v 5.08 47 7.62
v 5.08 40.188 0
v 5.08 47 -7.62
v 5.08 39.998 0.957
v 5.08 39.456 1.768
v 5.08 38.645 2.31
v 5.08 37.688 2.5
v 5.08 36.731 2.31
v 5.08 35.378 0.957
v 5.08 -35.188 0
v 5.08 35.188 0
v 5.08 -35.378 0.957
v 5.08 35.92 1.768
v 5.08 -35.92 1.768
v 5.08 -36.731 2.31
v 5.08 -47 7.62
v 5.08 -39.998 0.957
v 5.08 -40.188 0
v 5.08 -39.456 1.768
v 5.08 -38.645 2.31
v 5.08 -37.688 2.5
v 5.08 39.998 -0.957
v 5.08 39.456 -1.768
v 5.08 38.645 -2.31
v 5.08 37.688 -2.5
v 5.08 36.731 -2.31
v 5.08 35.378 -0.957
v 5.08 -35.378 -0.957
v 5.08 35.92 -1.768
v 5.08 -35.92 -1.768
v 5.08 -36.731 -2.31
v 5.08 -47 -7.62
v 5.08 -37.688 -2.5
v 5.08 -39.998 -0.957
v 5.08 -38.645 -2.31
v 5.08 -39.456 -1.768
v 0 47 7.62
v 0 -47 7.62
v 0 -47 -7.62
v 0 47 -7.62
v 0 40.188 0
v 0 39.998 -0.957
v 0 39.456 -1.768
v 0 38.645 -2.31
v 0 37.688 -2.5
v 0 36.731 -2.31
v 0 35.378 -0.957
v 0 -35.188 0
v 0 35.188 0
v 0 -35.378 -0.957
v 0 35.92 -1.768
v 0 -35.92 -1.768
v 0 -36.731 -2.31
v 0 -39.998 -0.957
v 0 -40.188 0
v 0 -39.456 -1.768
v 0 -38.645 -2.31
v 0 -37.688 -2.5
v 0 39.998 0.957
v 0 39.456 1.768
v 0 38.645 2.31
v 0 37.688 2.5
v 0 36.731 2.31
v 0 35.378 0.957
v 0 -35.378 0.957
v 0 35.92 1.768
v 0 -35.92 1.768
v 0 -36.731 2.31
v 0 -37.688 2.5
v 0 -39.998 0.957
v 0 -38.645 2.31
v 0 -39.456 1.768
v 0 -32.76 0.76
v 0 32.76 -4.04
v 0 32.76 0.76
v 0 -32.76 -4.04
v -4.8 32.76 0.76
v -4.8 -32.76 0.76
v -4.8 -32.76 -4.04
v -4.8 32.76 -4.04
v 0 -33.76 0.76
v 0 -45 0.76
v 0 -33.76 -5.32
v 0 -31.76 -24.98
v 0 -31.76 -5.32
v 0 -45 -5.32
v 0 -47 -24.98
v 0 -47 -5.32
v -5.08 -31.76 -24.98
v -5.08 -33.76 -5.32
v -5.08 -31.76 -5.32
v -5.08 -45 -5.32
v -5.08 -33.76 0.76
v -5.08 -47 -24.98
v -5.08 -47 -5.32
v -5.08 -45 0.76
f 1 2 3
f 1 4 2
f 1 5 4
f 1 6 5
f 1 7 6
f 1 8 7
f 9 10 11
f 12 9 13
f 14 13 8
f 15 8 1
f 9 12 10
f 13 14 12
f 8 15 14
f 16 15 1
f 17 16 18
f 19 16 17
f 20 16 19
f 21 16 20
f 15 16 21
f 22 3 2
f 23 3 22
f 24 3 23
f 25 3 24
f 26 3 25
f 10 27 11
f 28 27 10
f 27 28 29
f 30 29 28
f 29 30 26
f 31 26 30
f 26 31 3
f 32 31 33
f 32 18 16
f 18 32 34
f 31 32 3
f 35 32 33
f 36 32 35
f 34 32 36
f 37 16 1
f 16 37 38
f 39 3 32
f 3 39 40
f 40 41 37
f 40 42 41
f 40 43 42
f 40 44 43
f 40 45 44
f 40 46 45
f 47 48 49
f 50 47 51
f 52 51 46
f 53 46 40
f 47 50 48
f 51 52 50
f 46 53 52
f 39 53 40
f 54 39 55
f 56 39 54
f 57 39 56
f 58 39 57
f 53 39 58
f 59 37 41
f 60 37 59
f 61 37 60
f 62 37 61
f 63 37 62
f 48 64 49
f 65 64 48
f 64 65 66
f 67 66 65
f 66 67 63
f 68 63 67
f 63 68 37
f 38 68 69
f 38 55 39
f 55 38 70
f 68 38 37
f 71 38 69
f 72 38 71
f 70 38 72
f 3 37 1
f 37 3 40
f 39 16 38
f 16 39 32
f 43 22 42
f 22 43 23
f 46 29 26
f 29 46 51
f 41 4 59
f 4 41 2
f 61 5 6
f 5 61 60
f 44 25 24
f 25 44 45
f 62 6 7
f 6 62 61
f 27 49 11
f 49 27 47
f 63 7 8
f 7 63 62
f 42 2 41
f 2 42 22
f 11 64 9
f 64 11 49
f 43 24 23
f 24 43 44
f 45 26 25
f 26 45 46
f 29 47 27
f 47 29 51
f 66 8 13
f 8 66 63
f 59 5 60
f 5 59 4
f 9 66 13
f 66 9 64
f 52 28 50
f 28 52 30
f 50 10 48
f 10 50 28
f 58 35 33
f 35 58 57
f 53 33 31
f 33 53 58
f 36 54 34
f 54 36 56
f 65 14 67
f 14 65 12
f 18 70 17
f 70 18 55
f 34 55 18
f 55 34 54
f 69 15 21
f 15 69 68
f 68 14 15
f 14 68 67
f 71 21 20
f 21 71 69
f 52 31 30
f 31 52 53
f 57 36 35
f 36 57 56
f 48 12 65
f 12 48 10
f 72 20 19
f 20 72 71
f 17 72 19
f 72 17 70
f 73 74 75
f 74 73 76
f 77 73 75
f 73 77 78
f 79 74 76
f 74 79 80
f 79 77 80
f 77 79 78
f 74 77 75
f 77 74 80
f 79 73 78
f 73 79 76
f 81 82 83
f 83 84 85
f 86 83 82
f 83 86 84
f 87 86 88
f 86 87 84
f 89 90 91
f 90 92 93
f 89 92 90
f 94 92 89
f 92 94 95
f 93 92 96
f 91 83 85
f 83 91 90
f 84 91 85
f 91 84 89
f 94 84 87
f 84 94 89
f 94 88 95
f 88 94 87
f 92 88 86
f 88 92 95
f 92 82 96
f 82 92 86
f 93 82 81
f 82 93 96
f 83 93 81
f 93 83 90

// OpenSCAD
// file: ../hdim.scad
module hdim(x1 = 10, x2 = 20, y = 10, dimline_lenght = 9.0) 
{
    dimline_overlap = 0.5;
    dimline_width = 0.3;
    text_size = 2;
    tmp = 2*dimline_overlap+text_size/2;
    text_pos = dimline_lenght>0 ? tmp : -tmp; 
    dimline_abs = dimline_lenght>0 ? dimline_lenght : -dimline_lenght;
    
    color([0,0,0])
    {
        translate([x1,y-dimline_lenght/2,0]) 
            square([dimline_width, 
                dimline_abs + 2*dimline_overlap], 
                center=true, $fs=0.01);
                
        translate([x2,y-dimline_lenght/2,0]) 
            square([dimline_width, 
                dimline_abs + 2*dimline_overlap], 
                center=true, $fs=0.01);

        translate([(x1+x2)/2,y-dimline_lenght,0]) 
            square([x2-x1, 
                dimline_width], 
                center=true, $fs=0.01);
    }
        
    translate([(x1+x2)/2,y-dimline_lenght-text_pos,0]) 
    {
        color([0,0,0])
        cube([text_size * 5, 1.2*text_size, 0.9], center=true);
        
        color([0.8,0.8,0.5,1.0])
        {
            translate([0,0,0.2])
            text(str(0.1*round((x2-x1)*10)), size = text_size, 
                halign = "center",valign = "center");
            translate([0,0,-0.2])
            rotate([0,180,0])
            text(str(0.1*round((x2-x1)*10)), size = text_size, 
                halign = "center",valign = "center");
        }
    }
}

hdim();
// file: bedleg.scad
module bedleg(cw_w = 5.08, cw_h = 15.24, mirror = true, leglength=25.7,leg_angle=0) 
{
    translate([-cw_w/2,0, -cw_w/2]) 
    rotate([0,leg_angle,0])
    translate([cw_w/2,0, cw_w/2]) 
    {
        if (mirror) 
        {
            translate([-cw_w,0,-leglength]) 
                oneleg(cw_w, cw_h, leglength);
        }
        else {
            translate([0,0,-leglength])
                oneleg(cw_w, cw_h, leglength);

        }
    }
}

module oneleg(cw_w = 5.08, cw_h = 15.24, leglength=25.7)
{
    indent_w = 2;
    indent_h = cw_w + 1;
    
    color([0.40,0.30,0.16,1.0])
    translate([cw_w,0,leglength])
    rotate([-90,0,90])
    linear_extrude(cw_w)
    polygon(points=[[indent_w,0],[cw_h-indent_w,0],[cw_h-indent_w, indent_h],[cw_h, indent_h],[cw_h, leglength],[0,leglength],[0,indent_h], [indent_w,indent_h]]);

    color([0.8,0.8,0.5,1.0])
    {
        translate([0,cw_h/2,0]) 
        rotate([90,90,-90])
        text(str(0.1 * round(10*leglength)), size = 6, 
            halign = "right",valign = "center"); 
        translate([cw_w,cw_h/2,0]) 
        rotate([90,90,90])
        text(str(0.1 * round(10*leglength)), size = 6, 
            halign = "right",valign = "center");
    }
}    

bedleg();
// main file
use <bedleg.scad> 
use <../hdim.scad> 
extra_leg_spacing = -1.0;
bighole_diam = 5.0;
bighole_spacing = 0.3;
bighole_pos_coeff = 1.40; 

module bedend(mattress_width = 94, cw_w = 5.08, cw_h = 15.24, jw_w=4.80, jw_h = 4.8, groove_depth = 1.5, bed_height = 32.6,
    which_leg_to_hide = false) 
{
    leglength = bed_height - cw_h + jw_h - groove_depth + cw_w;

    translate([cw_w/2,0,0])
        color([0.71,0.40,0.11])
        difference() 
    {
        cube([cw_w, mattress_width, cw_h],center=true);
        
        translate([0,mattress_width/2 - bighole_pos_coeff * cw_w - bighole_diam/2+bighole_spacing,0])
        rotate([0,90,0]) 
        cylinder(h=cw_w+0.2,r=bighole_diam/2,center = true, $fn = 16);

        translate([0,-mattress_width/2 + bighole_pos_coeff * cw_w + bighole_diam/2 - bighole_spacing,0])
        rotate([0,90,0]) 
        cylinder(h=cw_w+0.2,r=bighole_diam/2,center = true, $fn = 16);
    }
    
    color([0.8,0.8,0.5,1.0])
    {
        translate([0,0,1.5]) 
        rotate([90,0,-90])
        text(str(0.1 * round(10*mattress_width)), size = 5, 
            halign = "center",valign = "bottom"); 
        translate([cw_w, 0,0]) 
        rotate([90,0,90])
        text(str(0.1 * round(10*mattress_width)), size = 6, 
            halign = "center",valign = "center");
    }
    
    translate([-cw_w-cw_h, 
        mattress_width/2, 
        -cw_h/2+jw_h-groove_depth+cw_w-leglength/2]) 
    rotate([90,-90,180]) 
    hdim(-leglength/2, leglength/2, jw_h/100, 3);
   
    translate([cw_w,0,0]) rotate([90,0,90])
        hdim(-mattress_width/2, mattress_width/2, 0, 16);

    translate([cw_w,0,0]) rotate([90,0,90])
        hdim(-mattress_width/2, -mattress_width/2 + bighole_pos_coeff * cw_w + bighole_diam/2 - bighole_spacing, 0, 4);
    
    w = mattress_width-2*cw_h-2*extra_leg_spacing;
    translate([-jw_w/2,0,-cw_h/2-jw_h/2+jw_h-groove_depth+cw_w]) 
        cube([jw_w, w, jw_h],center=true);
    
    translate([-jw_w,0,0]) rotate([90,0,90])
        hdim(-w/2, w/2, 0, 9);
    
    if (which_leg_to_hide) {
        leg_angle = -(($t > 0.5) ? (180 - 180 * $t) : (180 * $t));
        translate([0,mattress_width/2,-cw_h/2+jw_h-groove_depth+cw_w]) 
            rotate([0,0,180]) 
            bedleg(cw_w, cw_h, false, leglength, leg_angle);
    }
    
    if (!which_leg_to_hide) {
        leg_angle = (($t > 0.5) ? (180 - 180 * $t) : (180 * $t));
        translate([0,-mattress_width/2,-cw_h/2+jw_h-groove_depth+cw_w]) 
            bedleg(cw_w, cw_h, true, leglength, leg_angle);
    }
    translate([cw_w/2,-mattress_width/3, 0]) 
    rotate([90,-90,180]) 
    hdim(-cw_h/2, -cw_h/2+jw_h-groove_depth+cw_w, jw_h/100, 14);
}

bedend();
